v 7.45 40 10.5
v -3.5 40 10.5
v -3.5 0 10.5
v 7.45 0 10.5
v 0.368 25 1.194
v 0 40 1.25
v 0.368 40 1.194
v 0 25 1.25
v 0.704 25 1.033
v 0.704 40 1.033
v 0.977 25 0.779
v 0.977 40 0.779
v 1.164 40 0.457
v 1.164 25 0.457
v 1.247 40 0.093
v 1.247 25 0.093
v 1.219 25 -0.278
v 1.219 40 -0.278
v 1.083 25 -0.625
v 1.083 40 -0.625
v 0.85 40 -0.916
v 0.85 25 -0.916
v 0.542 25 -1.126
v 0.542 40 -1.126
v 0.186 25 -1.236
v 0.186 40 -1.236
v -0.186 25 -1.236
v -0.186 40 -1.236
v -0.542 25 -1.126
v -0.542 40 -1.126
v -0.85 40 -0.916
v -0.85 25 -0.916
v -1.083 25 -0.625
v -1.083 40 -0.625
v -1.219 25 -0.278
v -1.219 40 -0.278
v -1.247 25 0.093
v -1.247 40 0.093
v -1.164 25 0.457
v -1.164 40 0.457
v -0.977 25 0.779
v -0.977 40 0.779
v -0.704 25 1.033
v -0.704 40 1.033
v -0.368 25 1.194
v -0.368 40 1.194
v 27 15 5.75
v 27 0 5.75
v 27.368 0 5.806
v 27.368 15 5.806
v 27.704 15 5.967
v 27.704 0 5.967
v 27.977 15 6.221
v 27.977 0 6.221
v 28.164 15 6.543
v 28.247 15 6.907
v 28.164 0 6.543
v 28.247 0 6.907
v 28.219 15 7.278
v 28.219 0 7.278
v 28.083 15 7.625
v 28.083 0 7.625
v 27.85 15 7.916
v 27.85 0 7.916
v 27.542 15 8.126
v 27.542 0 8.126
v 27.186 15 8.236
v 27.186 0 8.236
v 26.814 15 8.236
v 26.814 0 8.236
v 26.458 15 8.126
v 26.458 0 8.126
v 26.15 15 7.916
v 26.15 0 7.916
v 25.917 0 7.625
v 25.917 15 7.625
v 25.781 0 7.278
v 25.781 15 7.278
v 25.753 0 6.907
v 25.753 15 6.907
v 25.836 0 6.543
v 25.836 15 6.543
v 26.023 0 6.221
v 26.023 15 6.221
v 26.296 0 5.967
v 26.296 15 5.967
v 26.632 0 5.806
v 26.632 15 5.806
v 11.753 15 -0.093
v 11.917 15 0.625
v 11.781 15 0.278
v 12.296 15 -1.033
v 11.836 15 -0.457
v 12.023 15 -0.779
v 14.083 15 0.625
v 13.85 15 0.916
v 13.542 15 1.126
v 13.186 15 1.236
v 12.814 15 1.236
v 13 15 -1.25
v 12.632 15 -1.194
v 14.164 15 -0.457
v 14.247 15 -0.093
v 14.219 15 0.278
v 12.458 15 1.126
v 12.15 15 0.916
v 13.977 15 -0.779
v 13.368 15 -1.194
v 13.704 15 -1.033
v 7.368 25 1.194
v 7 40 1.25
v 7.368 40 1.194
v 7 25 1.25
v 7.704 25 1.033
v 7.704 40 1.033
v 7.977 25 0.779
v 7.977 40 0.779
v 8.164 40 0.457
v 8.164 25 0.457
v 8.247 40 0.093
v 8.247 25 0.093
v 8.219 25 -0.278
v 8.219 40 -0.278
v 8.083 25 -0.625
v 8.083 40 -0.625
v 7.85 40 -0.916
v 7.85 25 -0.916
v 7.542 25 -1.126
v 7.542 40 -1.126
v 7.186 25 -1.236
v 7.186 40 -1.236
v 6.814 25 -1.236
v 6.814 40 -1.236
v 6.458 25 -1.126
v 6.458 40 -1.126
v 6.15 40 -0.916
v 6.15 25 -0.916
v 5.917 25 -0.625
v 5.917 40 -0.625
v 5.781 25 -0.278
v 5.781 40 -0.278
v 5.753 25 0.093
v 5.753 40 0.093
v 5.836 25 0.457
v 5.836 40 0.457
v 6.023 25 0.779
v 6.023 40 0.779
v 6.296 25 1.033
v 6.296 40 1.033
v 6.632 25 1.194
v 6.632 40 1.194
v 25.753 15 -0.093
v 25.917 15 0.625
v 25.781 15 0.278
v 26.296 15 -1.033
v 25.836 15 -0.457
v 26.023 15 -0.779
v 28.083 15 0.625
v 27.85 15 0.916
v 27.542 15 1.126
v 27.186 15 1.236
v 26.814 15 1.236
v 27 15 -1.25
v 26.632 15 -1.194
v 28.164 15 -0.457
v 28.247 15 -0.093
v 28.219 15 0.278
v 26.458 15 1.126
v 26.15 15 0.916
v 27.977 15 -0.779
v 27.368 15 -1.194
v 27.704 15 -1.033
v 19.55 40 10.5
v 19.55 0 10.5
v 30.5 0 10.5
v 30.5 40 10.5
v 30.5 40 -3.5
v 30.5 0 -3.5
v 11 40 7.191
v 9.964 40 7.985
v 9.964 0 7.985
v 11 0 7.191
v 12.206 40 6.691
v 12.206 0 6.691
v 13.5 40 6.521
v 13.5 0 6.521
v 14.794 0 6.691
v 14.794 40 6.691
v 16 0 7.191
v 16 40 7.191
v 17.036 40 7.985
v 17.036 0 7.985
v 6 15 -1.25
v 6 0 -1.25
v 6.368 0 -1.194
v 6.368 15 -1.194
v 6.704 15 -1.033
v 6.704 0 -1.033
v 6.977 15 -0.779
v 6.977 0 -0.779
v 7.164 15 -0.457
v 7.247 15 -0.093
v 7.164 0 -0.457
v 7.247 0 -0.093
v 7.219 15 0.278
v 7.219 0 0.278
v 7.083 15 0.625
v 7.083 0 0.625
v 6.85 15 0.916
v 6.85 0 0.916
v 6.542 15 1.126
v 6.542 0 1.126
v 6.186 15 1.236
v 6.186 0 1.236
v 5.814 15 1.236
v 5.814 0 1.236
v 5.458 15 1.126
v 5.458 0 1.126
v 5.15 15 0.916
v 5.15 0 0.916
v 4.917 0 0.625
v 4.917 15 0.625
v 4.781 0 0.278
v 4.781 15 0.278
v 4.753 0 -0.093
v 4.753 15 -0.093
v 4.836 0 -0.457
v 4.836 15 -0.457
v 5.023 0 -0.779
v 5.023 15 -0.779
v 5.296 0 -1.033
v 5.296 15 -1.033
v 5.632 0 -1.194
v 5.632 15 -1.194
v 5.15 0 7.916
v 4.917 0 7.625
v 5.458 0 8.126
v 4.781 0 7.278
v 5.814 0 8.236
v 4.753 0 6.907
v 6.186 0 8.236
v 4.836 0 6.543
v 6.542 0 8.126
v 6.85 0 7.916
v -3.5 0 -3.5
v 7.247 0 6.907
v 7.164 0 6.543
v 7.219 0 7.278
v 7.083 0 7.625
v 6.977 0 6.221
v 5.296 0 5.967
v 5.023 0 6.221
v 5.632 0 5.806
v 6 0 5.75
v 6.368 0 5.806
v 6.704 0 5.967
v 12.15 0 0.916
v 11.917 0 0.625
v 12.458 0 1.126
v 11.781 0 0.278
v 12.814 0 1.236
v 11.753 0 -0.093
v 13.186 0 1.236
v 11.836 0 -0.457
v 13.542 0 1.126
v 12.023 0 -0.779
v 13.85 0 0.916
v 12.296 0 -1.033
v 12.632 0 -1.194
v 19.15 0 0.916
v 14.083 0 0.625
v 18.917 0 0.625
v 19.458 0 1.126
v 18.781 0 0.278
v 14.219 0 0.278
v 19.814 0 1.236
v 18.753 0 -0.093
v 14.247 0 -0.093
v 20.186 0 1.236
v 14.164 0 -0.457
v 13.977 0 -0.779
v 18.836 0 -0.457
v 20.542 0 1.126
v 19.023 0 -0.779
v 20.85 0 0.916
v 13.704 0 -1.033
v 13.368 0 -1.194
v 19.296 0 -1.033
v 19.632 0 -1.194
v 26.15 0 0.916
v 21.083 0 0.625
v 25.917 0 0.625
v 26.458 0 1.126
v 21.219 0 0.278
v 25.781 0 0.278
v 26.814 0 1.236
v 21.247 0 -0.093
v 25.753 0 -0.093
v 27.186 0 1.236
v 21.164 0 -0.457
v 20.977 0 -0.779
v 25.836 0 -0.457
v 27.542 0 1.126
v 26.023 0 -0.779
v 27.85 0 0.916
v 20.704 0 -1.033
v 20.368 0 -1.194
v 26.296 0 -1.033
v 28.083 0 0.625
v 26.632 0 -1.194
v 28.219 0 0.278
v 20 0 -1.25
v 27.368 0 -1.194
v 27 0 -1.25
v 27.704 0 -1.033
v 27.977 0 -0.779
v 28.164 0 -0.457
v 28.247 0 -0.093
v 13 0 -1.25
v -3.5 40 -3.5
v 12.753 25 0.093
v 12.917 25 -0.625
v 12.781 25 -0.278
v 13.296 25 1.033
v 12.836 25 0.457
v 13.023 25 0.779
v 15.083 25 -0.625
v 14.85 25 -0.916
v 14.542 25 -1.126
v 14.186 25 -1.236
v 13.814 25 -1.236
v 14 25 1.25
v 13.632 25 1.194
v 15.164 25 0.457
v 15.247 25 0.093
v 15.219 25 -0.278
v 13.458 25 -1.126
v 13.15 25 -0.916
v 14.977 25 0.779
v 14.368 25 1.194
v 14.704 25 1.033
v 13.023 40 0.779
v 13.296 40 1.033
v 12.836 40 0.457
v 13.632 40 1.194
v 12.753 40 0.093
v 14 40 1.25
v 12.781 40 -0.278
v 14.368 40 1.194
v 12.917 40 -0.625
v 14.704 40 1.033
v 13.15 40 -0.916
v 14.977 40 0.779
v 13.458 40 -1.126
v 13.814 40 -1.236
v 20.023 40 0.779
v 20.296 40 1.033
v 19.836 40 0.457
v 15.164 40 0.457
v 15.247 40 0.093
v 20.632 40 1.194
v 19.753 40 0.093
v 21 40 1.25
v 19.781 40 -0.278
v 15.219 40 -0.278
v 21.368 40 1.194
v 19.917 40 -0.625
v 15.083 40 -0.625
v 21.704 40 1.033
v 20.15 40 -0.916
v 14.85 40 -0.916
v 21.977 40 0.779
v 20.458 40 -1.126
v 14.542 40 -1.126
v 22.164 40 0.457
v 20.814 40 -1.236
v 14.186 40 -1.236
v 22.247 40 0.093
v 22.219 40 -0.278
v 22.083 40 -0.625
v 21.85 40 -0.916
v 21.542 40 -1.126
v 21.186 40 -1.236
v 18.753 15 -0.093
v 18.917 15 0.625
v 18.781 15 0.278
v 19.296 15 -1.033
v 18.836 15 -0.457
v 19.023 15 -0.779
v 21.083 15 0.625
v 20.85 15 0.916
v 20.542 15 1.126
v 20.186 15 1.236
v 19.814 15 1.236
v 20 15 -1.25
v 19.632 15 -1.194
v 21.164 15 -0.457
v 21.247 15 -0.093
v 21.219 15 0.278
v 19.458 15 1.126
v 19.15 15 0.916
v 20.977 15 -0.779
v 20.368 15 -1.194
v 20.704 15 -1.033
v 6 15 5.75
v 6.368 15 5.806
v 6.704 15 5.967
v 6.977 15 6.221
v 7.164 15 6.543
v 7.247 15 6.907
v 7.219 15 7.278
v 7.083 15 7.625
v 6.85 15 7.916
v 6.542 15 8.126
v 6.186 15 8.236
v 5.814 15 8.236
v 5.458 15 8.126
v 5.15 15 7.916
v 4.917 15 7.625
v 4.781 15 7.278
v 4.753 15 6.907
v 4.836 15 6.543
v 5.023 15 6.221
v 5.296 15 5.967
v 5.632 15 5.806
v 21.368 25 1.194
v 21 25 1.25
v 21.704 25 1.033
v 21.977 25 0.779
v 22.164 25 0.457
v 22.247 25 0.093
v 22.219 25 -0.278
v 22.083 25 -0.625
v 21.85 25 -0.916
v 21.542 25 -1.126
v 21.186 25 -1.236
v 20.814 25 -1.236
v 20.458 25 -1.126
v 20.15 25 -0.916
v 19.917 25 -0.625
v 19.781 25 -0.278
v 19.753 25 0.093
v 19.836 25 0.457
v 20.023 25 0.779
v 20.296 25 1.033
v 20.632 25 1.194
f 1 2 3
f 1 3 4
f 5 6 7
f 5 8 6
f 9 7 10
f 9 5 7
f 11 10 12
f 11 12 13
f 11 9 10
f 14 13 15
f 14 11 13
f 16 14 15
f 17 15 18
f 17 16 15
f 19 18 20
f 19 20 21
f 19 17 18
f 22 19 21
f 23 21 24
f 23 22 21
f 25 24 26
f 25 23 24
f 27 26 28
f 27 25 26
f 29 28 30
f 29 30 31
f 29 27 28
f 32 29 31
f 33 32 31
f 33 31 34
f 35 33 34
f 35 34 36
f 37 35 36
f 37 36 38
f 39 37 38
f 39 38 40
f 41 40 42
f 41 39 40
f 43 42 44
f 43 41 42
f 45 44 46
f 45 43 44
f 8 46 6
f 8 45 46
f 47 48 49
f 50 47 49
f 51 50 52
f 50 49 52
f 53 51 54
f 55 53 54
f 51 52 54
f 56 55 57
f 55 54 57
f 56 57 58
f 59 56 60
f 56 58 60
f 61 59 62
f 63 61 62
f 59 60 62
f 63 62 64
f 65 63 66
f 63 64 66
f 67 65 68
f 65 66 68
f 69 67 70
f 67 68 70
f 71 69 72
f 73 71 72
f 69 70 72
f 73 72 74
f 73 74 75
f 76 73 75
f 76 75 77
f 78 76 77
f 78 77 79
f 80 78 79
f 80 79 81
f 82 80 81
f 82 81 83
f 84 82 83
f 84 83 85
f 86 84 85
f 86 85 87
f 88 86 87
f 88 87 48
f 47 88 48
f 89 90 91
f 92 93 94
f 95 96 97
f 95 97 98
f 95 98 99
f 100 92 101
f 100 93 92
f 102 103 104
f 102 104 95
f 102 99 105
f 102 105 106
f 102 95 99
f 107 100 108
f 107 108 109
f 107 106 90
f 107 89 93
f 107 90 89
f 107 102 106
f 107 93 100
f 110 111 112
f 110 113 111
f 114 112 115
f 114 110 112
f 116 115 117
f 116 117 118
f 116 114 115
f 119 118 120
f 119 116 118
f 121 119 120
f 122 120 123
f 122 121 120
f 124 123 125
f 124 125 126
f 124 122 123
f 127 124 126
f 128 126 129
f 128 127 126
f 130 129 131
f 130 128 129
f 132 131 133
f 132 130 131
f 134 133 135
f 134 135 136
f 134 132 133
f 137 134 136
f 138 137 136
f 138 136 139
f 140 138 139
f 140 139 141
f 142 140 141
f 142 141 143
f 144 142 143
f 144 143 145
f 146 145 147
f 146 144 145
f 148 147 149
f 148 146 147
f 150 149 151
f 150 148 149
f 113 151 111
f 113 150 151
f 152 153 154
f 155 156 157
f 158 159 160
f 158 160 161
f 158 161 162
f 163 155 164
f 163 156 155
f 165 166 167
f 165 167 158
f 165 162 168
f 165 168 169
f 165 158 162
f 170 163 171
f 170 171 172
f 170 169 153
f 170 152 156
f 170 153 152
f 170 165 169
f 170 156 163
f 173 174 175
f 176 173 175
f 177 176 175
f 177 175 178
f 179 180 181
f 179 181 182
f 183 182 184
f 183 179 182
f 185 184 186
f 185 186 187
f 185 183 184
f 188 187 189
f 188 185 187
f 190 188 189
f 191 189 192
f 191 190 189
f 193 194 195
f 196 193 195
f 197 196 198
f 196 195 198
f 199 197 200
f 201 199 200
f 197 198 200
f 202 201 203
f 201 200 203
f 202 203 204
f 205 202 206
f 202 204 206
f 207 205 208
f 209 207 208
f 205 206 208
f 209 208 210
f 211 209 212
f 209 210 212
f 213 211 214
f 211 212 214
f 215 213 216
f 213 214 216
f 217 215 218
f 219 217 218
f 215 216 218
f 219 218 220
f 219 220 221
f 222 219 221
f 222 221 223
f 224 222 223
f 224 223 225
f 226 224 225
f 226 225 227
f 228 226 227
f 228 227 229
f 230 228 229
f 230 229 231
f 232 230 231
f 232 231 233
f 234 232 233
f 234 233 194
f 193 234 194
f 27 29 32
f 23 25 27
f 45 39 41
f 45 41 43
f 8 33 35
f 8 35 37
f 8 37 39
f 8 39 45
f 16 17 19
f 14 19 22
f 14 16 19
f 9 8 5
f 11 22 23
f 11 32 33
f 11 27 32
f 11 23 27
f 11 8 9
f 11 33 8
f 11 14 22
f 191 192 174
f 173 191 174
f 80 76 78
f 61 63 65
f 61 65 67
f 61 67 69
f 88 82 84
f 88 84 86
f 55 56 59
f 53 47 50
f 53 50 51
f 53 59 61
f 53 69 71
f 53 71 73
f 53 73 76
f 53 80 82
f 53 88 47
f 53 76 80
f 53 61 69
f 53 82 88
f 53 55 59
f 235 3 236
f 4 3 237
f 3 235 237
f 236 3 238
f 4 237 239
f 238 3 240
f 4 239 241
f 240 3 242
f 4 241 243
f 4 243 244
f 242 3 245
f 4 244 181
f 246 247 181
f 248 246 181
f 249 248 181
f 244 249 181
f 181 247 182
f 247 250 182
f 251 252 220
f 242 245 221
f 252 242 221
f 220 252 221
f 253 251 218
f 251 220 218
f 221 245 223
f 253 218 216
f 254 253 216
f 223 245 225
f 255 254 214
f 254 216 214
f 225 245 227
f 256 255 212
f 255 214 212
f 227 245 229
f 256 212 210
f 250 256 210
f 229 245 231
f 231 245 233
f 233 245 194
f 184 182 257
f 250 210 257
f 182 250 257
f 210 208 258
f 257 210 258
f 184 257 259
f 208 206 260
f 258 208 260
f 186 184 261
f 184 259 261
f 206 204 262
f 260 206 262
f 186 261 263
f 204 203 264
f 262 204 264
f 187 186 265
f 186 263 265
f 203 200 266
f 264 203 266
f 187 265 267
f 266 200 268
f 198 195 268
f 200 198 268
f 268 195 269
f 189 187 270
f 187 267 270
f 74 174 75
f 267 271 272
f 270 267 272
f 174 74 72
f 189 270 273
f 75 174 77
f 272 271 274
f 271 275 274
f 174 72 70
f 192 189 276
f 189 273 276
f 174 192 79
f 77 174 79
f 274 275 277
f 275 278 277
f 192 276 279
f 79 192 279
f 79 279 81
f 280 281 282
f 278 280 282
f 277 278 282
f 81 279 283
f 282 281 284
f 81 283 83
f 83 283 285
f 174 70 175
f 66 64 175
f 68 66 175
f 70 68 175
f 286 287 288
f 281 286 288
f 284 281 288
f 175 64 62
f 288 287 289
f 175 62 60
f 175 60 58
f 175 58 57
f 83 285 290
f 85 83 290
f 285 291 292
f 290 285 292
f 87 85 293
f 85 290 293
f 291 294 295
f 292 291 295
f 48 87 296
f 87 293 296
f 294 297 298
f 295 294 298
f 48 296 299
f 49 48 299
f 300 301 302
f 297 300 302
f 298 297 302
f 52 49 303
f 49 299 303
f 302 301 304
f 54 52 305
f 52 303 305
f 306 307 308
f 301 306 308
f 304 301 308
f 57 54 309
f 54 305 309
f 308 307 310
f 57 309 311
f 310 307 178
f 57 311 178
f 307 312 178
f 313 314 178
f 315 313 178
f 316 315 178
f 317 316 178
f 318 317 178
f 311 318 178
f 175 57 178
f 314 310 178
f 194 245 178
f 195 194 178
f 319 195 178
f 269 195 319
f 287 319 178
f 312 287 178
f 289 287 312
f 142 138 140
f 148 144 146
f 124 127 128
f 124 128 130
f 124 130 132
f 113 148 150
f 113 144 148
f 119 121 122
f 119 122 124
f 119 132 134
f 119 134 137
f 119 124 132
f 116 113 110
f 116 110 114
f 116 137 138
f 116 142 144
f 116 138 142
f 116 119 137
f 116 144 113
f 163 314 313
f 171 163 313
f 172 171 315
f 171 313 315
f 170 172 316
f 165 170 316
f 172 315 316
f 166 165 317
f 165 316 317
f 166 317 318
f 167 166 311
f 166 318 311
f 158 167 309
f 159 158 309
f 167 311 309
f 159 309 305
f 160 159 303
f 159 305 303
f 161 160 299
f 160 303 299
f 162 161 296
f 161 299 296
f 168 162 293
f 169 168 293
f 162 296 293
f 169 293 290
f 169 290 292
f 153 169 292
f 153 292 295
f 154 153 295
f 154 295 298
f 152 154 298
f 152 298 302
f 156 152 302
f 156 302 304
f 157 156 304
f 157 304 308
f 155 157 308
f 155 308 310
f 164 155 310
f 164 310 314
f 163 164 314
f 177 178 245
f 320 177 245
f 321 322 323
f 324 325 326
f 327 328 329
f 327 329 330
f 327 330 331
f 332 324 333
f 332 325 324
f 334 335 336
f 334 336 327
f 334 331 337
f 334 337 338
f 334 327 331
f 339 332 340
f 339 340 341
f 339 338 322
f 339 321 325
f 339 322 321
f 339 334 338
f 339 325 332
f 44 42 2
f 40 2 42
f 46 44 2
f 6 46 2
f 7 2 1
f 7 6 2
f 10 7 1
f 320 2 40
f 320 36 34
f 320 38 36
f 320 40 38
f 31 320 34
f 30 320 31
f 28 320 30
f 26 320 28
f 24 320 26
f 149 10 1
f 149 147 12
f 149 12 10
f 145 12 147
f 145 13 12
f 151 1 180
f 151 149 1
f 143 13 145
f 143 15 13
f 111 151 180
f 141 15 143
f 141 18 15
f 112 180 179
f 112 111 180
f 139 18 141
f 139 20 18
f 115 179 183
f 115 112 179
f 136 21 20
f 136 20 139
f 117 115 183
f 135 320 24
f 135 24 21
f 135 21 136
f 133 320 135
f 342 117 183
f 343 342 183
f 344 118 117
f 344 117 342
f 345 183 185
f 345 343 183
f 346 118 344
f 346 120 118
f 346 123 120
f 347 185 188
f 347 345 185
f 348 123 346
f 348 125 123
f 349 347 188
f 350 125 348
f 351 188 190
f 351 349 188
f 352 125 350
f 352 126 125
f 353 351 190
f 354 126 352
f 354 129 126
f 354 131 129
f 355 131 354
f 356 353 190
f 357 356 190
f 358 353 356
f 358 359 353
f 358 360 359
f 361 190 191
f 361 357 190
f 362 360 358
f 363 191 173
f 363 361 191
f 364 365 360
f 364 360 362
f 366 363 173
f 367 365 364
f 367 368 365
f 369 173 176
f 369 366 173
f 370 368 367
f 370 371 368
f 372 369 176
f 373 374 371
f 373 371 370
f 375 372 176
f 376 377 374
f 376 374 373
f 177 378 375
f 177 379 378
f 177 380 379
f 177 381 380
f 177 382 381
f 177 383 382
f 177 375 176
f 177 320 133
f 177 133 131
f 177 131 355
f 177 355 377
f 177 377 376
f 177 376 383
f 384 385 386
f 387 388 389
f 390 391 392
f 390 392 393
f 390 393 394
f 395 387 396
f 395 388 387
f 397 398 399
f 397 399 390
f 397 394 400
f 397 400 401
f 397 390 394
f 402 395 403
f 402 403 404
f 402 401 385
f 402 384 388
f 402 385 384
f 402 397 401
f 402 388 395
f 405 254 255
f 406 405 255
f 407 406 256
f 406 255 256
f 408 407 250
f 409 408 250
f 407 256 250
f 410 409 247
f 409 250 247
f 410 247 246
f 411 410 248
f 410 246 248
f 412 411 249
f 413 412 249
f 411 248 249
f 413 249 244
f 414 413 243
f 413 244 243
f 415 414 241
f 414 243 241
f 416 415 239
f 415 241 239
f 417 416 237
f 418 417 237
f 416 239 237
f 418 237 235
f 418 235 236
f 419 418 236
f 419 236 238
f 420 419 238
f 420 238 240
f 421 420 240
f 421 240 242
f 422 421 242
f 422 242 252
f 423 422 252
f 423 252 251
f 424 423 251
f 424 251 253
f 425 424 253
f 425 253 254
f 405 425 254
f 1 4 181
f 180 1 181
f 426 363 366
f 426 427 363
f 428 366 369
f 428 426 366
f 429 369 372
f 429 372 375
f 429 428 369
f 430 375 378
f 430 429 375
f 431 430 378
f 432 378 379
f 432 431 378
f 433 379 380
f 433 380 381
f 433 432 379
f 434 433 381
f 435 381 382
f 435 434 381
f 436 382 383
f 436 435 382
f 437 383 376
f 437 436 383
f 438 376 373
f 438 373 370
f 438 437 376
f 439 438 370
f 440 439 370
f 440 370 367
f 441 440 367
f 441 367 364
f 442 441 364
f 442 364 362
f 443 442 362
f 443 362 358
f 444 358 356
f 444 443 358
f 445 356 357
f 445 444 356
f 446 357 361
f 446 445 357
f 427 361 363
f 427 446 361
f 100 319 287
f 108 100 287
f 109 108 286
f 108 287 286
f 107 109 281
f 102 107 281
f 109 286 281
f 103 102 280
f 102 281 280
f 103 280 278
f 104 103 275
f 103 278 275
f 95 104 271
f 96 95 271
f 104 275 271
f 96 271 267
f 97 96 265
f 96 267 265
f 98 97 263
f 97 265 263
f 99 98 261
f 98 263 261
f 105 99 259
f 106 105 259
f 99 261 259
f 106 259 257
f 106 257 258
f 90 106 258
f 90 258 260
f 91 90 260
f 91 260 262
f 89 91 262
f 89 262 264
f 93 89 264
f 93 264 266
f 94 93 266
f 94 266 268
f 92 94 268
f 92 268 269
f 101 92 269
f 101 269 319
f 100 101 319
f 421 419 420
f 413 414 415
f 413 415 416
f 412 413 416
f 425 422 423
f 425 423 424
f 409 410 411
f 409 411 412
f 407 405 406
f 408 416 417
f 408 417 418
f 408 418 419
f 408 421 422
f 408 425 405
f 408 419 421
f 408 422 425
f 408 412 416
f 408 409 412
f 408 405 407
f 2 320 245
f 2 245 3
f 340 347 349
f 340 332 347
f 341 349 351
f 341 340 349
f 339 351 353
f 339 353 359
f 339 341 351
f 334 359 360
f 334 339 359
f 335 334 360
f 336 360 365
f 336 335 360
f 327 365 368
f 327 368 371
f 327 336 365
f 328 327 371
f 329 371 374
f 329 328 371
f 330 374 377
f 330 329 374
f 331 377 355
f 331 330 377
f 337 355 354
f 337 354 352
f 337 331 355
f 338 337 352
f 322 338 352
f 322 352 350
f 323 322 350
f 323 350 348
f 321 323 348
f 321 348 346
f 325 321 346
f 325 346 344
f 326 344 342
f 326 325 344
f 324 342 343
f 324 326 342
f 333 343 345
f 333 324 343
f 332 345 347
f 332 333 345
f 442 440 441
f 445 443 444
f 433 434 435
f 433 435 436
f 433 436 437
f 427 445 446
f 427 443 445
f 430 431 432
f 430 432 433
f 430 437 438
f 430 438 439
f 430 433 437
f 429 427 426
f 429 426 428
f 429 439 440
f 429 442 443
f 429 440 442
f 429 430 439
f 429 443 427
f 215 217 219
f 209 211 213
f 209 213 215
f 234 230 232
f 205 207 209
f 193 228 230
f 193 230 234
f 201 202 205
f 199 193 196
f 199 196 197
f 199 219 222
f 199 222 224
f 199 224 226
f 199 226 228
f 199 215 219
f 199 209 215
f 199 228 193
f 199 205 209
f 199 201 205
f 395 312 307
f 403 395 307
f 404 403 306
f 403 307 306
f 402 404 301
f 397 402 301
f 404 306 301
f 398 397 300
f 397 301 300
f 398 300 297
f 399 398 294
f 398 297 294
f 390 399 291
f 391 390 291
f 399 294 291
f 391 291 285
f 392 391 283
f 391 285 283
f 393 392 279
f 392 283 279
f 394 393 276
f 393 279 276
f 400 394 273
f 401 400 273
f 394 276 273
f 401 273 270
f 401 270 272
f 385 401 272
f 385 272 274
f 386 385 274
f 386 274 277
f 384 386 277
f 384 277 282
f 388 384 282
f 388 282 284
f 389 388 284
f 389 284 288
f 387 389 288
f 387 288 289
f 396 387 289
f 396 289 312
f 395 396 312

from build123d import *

# Parameters (mm, degrees)
SKETCH_1_R          = 1.25
EXTRUDE_1_DEPTH     = 40
SKETCH_2_R          = 1.25
EXTRUDE_2_DEPTH     = 30
SKETCH_2_3_R        = 1.25
CUT_EXTRUDE_1_DEPTH = 10
EXTRUDE_START       = -10
EXTRUDE_3_DEPTH     = 10
CUT_EXTRUDE_START   = -15
SKETCH_4_R          = 1.25
CUT_EXTRUDE_2_DEPTH = 15
SKETCH_5_R          = 1.25
CUT_EXTRUDE_3_DEPTH = 15
EXTRUDE_4_DEPTH     = 40


with BuildPart() as part:
    # 草图1 → 凸台-拉伸1 (new body)
    with BuildSketch(Plane(origin=(0, 0, 0), x_dir=(1, 0, 0), z_dir=(0, 1, 0))):
        Polygon((-3.5, 3.5), (-3.5, -10.5), (1.449747468, -10.5), (7.449747468, -10.5), (13.495730206, -4.454017262), (13.504269794, -4.454017262), (19.550252532, -10.5), (24.5, -10.5), (30.5, -10.5), (30.5, 3.5), (24.5, 3.5), align=None)
        with Locations(Location((0, 0, 0), (0, 0, 270))):
            Circle(SKETCH_1_R, mode=Mode.SUBTRACT)
        with Locations(Location((7, 0, 0), (0, 0, 270))):
            Circle(SKETCH_1_R, mode=Mode.SUBTRACT)
        with Locations(Location((14, 0, 0), (0, 0, 270))):
            Circle(SKETCH_1_R, mode=Mode.SUBTRACT)
        with Locations(Location((21, 0, 0), (0, 0, 270))):
            Circle(SKETCH_1_R, mode=Mode.SUBTRACT)
        with Locations(Location((21, -7, 0), (0, 0, 270))):
            Circle(SKETCH_1_R, mode=Mode.SUBTRACT)
        with Locations(Location((0, -7, 0), (0, 0, 270))):
            Circle(SKETCH_1_R, mode=Mode.SUBTRACT)
    extrude(amount=EXTRUDE_1_DEPTH)

    # 草图2 → 凸台-拉伸2 (add)
    with BuildSketch(Plane.XZ):
        with Locations(Location((0, 7, 0), (0, 0, 270))):
            Circle(SKETCH_2_R)
        with Locations(Location((0, 0, 0), (0, 0, 270))):
            Circle(SKETCH_2_R)
        with Locations((6, 0)):
            Circle(SKETCH_2_R)
        with Locations(Location((7, 0, 0), (0, 0, 270))):
            Circle(SKETCH_2_R)
        with Locations((13, 0)):
            Circle(SKETCH_2_R)
        with Locations(Location((14, 0, 0), (0, 0, 270))):
            Circle(SKETCH_2_R)
        with Locations((20, 0)):
            Circle(SKETCH_2_R)
        with Locations(Location((21, 0, 0), (0, 0, 270))):
            Circle(SKETCH_2_R)
        with Locations(Location((21, 7, 0), (0, 0, 270))):
            Circle(SKETCH_2_R)
    extrude(amount=-EXTRUDE_2_DEPTH)

    # 草图2<3> → 切除-拉伸1 (cut)
    with BuildSketch(Plane.XZ):
        with Locations(Location((27, 7, 0), (0, 0, 270))):
            Circle(SKETCH_2_3_R)
        with Locations(Location((27, 0, 0), (0, 0, 270))):
            Circle(SKETCH_2_3_R)
        with Locations(Location((20, 0, 0), (0, 0, 270))):
            Circle(SKETCH_2_3_R)
        with Locations(Location((13, 0, 0), (0, 0, 270))):
            Circle(SKETCH_2_3_R)
        with Locations(Location((6, 0, 0), (0, 0, 270))):
            Circle(SKETCH_2_3_R)
        with Locations(Location((6, 7, 0), (0, 0, 270))):
            Circle(SKETCH_2_3_R)
    extrude(amount=-CUT_EXTRUDE_1_DEPTH, mode=Mode.SUBTRACT)

    # 草图3 → 凸台-拉伸3 (add)
    with BuildSketch(Plane(origin=(0, 40, 0), x_dir=(1, 0, 0), z_dir=(0, 1, 0)).offset(EXTRUDE_START)):
        with BuildLine():
            ThreePointArc((1.124456691, -6.454017262), (0, -5.75), (-1.124456691, -6.454017262))
            Line((-1.124456691, -6.454017262), (1.124456691, -6.454017262))
        make_face()
        with BuildLine():
            Line((1.124456691, -6.454017262), (-1.124456691, -6.454017262))
            ThreePointArc((-1.124456691, -6.454017262), (-0.280115276, -8.218209929), (1.25, -7))
            ThreePointArc((1.25, -7), (1.218209929, -6.719884724), (1.124456691, -6.454017262))
        make_face()
        with BuildLine():
            ThreePointArc((22.25, -7), (22.218209929, -6.719884724), (22.124456691, -6.454017262))
            Line((22.124456691, -6.454017262), (19.875543309, -6.454017262))
            ThreePointArc((19.875543309, -6.454017262), (20.719884724, -8.218209929), (22.25, -7))
        make_face()
        with BuildLine():
            Line((19.875543309, -6.454017262), (22.124456691, -6.454017262))
            ThreePointArc((22.124456691, -6.454017262), (21, -5.75), (19.875543309, -6.454017262))
        make_face()
    extrude(amount=EXTRUDE_3_DEPTH)

    # 草图4 → 切除-拉伸2 (cut)
    with BuildSketch(Plane(origin=(0, 40, 0), x_dir=(1, 0, 0), z_dir=(0, 1, 0)).offset(CUT_EXTRUDE_START)):
        with Locations(Location((21, 0, 0), (0, 0, 270))):
            Circle(SKETCH_4_R)
        with Locations(Location((14, 0, 0), (0, 0, 270))):
            Circle(SKETCH_4_R)
        with Locations(Location((7, 0, 0), (0, 0, 270))):
            Circle(SKETCH_4_R)
        with Locations(Location((0, 0, 0), (0, 0, 270))):
            Circle(SKETCH_4_R)
    extrude(amount=CUT_EXTRUDE_2_DEPTH, mode=Mode.SUBTRACT)

    # 草图5 → 切除-拉伸3 (cut)
    with BuildSketch(Plane.XZ):
        with Locations(Location((6, 7, 0), (0, 0, 270))):
            Circle(SKETCH_5_R)
        with Locations(Location((27, 7, 0), (0, 0, 270))):
            Circle(SKETCH_5_R)
        with Locations(Location((27, 0, 0), (0, 0, 270))):
            Circle(SKETCH_5_R)
        with Locations(Location((20, 0, 0), (0, 0, 270))):
            Circle(SKETCH_5_R)
        with Locations(Location((13, 0, 0), (0, 0, 270))):
            Circle(SKETCH_5_R)
        with Locations(Location((6, 0, 0), (0, 0, 270))):
            Circle(SKETCH_5_R)
    extrude(amount=-CUT_EXTRUDE_3_DEPTH, mode=Mode.SUBTRACT)

    # 草图6 → 凸台-拉伸4 (add)
    with BuildSketch(Plane(origin=(0, 40, 0), x_dir=(1, 0, 0), z_dir=(0, 1, 0))):
        with BuildLine():
            Line((13.504269794, -4.454017262), (13.495730206, -4.454017262))
            Line((13.495730206, -4.454017262), (9.964466094, -7.985281374))
            ThreePointArc((9.964466094, -7.985281374), (13.5, -6.52081528), (17.035533906, -7.985281374))
            Line((17.035533906, -7.985281374), (13.504269794, -4.454017262))
        make_face()
    extrude(amount=-EXTRUDE_4_DEPTH)


solid = part.part
